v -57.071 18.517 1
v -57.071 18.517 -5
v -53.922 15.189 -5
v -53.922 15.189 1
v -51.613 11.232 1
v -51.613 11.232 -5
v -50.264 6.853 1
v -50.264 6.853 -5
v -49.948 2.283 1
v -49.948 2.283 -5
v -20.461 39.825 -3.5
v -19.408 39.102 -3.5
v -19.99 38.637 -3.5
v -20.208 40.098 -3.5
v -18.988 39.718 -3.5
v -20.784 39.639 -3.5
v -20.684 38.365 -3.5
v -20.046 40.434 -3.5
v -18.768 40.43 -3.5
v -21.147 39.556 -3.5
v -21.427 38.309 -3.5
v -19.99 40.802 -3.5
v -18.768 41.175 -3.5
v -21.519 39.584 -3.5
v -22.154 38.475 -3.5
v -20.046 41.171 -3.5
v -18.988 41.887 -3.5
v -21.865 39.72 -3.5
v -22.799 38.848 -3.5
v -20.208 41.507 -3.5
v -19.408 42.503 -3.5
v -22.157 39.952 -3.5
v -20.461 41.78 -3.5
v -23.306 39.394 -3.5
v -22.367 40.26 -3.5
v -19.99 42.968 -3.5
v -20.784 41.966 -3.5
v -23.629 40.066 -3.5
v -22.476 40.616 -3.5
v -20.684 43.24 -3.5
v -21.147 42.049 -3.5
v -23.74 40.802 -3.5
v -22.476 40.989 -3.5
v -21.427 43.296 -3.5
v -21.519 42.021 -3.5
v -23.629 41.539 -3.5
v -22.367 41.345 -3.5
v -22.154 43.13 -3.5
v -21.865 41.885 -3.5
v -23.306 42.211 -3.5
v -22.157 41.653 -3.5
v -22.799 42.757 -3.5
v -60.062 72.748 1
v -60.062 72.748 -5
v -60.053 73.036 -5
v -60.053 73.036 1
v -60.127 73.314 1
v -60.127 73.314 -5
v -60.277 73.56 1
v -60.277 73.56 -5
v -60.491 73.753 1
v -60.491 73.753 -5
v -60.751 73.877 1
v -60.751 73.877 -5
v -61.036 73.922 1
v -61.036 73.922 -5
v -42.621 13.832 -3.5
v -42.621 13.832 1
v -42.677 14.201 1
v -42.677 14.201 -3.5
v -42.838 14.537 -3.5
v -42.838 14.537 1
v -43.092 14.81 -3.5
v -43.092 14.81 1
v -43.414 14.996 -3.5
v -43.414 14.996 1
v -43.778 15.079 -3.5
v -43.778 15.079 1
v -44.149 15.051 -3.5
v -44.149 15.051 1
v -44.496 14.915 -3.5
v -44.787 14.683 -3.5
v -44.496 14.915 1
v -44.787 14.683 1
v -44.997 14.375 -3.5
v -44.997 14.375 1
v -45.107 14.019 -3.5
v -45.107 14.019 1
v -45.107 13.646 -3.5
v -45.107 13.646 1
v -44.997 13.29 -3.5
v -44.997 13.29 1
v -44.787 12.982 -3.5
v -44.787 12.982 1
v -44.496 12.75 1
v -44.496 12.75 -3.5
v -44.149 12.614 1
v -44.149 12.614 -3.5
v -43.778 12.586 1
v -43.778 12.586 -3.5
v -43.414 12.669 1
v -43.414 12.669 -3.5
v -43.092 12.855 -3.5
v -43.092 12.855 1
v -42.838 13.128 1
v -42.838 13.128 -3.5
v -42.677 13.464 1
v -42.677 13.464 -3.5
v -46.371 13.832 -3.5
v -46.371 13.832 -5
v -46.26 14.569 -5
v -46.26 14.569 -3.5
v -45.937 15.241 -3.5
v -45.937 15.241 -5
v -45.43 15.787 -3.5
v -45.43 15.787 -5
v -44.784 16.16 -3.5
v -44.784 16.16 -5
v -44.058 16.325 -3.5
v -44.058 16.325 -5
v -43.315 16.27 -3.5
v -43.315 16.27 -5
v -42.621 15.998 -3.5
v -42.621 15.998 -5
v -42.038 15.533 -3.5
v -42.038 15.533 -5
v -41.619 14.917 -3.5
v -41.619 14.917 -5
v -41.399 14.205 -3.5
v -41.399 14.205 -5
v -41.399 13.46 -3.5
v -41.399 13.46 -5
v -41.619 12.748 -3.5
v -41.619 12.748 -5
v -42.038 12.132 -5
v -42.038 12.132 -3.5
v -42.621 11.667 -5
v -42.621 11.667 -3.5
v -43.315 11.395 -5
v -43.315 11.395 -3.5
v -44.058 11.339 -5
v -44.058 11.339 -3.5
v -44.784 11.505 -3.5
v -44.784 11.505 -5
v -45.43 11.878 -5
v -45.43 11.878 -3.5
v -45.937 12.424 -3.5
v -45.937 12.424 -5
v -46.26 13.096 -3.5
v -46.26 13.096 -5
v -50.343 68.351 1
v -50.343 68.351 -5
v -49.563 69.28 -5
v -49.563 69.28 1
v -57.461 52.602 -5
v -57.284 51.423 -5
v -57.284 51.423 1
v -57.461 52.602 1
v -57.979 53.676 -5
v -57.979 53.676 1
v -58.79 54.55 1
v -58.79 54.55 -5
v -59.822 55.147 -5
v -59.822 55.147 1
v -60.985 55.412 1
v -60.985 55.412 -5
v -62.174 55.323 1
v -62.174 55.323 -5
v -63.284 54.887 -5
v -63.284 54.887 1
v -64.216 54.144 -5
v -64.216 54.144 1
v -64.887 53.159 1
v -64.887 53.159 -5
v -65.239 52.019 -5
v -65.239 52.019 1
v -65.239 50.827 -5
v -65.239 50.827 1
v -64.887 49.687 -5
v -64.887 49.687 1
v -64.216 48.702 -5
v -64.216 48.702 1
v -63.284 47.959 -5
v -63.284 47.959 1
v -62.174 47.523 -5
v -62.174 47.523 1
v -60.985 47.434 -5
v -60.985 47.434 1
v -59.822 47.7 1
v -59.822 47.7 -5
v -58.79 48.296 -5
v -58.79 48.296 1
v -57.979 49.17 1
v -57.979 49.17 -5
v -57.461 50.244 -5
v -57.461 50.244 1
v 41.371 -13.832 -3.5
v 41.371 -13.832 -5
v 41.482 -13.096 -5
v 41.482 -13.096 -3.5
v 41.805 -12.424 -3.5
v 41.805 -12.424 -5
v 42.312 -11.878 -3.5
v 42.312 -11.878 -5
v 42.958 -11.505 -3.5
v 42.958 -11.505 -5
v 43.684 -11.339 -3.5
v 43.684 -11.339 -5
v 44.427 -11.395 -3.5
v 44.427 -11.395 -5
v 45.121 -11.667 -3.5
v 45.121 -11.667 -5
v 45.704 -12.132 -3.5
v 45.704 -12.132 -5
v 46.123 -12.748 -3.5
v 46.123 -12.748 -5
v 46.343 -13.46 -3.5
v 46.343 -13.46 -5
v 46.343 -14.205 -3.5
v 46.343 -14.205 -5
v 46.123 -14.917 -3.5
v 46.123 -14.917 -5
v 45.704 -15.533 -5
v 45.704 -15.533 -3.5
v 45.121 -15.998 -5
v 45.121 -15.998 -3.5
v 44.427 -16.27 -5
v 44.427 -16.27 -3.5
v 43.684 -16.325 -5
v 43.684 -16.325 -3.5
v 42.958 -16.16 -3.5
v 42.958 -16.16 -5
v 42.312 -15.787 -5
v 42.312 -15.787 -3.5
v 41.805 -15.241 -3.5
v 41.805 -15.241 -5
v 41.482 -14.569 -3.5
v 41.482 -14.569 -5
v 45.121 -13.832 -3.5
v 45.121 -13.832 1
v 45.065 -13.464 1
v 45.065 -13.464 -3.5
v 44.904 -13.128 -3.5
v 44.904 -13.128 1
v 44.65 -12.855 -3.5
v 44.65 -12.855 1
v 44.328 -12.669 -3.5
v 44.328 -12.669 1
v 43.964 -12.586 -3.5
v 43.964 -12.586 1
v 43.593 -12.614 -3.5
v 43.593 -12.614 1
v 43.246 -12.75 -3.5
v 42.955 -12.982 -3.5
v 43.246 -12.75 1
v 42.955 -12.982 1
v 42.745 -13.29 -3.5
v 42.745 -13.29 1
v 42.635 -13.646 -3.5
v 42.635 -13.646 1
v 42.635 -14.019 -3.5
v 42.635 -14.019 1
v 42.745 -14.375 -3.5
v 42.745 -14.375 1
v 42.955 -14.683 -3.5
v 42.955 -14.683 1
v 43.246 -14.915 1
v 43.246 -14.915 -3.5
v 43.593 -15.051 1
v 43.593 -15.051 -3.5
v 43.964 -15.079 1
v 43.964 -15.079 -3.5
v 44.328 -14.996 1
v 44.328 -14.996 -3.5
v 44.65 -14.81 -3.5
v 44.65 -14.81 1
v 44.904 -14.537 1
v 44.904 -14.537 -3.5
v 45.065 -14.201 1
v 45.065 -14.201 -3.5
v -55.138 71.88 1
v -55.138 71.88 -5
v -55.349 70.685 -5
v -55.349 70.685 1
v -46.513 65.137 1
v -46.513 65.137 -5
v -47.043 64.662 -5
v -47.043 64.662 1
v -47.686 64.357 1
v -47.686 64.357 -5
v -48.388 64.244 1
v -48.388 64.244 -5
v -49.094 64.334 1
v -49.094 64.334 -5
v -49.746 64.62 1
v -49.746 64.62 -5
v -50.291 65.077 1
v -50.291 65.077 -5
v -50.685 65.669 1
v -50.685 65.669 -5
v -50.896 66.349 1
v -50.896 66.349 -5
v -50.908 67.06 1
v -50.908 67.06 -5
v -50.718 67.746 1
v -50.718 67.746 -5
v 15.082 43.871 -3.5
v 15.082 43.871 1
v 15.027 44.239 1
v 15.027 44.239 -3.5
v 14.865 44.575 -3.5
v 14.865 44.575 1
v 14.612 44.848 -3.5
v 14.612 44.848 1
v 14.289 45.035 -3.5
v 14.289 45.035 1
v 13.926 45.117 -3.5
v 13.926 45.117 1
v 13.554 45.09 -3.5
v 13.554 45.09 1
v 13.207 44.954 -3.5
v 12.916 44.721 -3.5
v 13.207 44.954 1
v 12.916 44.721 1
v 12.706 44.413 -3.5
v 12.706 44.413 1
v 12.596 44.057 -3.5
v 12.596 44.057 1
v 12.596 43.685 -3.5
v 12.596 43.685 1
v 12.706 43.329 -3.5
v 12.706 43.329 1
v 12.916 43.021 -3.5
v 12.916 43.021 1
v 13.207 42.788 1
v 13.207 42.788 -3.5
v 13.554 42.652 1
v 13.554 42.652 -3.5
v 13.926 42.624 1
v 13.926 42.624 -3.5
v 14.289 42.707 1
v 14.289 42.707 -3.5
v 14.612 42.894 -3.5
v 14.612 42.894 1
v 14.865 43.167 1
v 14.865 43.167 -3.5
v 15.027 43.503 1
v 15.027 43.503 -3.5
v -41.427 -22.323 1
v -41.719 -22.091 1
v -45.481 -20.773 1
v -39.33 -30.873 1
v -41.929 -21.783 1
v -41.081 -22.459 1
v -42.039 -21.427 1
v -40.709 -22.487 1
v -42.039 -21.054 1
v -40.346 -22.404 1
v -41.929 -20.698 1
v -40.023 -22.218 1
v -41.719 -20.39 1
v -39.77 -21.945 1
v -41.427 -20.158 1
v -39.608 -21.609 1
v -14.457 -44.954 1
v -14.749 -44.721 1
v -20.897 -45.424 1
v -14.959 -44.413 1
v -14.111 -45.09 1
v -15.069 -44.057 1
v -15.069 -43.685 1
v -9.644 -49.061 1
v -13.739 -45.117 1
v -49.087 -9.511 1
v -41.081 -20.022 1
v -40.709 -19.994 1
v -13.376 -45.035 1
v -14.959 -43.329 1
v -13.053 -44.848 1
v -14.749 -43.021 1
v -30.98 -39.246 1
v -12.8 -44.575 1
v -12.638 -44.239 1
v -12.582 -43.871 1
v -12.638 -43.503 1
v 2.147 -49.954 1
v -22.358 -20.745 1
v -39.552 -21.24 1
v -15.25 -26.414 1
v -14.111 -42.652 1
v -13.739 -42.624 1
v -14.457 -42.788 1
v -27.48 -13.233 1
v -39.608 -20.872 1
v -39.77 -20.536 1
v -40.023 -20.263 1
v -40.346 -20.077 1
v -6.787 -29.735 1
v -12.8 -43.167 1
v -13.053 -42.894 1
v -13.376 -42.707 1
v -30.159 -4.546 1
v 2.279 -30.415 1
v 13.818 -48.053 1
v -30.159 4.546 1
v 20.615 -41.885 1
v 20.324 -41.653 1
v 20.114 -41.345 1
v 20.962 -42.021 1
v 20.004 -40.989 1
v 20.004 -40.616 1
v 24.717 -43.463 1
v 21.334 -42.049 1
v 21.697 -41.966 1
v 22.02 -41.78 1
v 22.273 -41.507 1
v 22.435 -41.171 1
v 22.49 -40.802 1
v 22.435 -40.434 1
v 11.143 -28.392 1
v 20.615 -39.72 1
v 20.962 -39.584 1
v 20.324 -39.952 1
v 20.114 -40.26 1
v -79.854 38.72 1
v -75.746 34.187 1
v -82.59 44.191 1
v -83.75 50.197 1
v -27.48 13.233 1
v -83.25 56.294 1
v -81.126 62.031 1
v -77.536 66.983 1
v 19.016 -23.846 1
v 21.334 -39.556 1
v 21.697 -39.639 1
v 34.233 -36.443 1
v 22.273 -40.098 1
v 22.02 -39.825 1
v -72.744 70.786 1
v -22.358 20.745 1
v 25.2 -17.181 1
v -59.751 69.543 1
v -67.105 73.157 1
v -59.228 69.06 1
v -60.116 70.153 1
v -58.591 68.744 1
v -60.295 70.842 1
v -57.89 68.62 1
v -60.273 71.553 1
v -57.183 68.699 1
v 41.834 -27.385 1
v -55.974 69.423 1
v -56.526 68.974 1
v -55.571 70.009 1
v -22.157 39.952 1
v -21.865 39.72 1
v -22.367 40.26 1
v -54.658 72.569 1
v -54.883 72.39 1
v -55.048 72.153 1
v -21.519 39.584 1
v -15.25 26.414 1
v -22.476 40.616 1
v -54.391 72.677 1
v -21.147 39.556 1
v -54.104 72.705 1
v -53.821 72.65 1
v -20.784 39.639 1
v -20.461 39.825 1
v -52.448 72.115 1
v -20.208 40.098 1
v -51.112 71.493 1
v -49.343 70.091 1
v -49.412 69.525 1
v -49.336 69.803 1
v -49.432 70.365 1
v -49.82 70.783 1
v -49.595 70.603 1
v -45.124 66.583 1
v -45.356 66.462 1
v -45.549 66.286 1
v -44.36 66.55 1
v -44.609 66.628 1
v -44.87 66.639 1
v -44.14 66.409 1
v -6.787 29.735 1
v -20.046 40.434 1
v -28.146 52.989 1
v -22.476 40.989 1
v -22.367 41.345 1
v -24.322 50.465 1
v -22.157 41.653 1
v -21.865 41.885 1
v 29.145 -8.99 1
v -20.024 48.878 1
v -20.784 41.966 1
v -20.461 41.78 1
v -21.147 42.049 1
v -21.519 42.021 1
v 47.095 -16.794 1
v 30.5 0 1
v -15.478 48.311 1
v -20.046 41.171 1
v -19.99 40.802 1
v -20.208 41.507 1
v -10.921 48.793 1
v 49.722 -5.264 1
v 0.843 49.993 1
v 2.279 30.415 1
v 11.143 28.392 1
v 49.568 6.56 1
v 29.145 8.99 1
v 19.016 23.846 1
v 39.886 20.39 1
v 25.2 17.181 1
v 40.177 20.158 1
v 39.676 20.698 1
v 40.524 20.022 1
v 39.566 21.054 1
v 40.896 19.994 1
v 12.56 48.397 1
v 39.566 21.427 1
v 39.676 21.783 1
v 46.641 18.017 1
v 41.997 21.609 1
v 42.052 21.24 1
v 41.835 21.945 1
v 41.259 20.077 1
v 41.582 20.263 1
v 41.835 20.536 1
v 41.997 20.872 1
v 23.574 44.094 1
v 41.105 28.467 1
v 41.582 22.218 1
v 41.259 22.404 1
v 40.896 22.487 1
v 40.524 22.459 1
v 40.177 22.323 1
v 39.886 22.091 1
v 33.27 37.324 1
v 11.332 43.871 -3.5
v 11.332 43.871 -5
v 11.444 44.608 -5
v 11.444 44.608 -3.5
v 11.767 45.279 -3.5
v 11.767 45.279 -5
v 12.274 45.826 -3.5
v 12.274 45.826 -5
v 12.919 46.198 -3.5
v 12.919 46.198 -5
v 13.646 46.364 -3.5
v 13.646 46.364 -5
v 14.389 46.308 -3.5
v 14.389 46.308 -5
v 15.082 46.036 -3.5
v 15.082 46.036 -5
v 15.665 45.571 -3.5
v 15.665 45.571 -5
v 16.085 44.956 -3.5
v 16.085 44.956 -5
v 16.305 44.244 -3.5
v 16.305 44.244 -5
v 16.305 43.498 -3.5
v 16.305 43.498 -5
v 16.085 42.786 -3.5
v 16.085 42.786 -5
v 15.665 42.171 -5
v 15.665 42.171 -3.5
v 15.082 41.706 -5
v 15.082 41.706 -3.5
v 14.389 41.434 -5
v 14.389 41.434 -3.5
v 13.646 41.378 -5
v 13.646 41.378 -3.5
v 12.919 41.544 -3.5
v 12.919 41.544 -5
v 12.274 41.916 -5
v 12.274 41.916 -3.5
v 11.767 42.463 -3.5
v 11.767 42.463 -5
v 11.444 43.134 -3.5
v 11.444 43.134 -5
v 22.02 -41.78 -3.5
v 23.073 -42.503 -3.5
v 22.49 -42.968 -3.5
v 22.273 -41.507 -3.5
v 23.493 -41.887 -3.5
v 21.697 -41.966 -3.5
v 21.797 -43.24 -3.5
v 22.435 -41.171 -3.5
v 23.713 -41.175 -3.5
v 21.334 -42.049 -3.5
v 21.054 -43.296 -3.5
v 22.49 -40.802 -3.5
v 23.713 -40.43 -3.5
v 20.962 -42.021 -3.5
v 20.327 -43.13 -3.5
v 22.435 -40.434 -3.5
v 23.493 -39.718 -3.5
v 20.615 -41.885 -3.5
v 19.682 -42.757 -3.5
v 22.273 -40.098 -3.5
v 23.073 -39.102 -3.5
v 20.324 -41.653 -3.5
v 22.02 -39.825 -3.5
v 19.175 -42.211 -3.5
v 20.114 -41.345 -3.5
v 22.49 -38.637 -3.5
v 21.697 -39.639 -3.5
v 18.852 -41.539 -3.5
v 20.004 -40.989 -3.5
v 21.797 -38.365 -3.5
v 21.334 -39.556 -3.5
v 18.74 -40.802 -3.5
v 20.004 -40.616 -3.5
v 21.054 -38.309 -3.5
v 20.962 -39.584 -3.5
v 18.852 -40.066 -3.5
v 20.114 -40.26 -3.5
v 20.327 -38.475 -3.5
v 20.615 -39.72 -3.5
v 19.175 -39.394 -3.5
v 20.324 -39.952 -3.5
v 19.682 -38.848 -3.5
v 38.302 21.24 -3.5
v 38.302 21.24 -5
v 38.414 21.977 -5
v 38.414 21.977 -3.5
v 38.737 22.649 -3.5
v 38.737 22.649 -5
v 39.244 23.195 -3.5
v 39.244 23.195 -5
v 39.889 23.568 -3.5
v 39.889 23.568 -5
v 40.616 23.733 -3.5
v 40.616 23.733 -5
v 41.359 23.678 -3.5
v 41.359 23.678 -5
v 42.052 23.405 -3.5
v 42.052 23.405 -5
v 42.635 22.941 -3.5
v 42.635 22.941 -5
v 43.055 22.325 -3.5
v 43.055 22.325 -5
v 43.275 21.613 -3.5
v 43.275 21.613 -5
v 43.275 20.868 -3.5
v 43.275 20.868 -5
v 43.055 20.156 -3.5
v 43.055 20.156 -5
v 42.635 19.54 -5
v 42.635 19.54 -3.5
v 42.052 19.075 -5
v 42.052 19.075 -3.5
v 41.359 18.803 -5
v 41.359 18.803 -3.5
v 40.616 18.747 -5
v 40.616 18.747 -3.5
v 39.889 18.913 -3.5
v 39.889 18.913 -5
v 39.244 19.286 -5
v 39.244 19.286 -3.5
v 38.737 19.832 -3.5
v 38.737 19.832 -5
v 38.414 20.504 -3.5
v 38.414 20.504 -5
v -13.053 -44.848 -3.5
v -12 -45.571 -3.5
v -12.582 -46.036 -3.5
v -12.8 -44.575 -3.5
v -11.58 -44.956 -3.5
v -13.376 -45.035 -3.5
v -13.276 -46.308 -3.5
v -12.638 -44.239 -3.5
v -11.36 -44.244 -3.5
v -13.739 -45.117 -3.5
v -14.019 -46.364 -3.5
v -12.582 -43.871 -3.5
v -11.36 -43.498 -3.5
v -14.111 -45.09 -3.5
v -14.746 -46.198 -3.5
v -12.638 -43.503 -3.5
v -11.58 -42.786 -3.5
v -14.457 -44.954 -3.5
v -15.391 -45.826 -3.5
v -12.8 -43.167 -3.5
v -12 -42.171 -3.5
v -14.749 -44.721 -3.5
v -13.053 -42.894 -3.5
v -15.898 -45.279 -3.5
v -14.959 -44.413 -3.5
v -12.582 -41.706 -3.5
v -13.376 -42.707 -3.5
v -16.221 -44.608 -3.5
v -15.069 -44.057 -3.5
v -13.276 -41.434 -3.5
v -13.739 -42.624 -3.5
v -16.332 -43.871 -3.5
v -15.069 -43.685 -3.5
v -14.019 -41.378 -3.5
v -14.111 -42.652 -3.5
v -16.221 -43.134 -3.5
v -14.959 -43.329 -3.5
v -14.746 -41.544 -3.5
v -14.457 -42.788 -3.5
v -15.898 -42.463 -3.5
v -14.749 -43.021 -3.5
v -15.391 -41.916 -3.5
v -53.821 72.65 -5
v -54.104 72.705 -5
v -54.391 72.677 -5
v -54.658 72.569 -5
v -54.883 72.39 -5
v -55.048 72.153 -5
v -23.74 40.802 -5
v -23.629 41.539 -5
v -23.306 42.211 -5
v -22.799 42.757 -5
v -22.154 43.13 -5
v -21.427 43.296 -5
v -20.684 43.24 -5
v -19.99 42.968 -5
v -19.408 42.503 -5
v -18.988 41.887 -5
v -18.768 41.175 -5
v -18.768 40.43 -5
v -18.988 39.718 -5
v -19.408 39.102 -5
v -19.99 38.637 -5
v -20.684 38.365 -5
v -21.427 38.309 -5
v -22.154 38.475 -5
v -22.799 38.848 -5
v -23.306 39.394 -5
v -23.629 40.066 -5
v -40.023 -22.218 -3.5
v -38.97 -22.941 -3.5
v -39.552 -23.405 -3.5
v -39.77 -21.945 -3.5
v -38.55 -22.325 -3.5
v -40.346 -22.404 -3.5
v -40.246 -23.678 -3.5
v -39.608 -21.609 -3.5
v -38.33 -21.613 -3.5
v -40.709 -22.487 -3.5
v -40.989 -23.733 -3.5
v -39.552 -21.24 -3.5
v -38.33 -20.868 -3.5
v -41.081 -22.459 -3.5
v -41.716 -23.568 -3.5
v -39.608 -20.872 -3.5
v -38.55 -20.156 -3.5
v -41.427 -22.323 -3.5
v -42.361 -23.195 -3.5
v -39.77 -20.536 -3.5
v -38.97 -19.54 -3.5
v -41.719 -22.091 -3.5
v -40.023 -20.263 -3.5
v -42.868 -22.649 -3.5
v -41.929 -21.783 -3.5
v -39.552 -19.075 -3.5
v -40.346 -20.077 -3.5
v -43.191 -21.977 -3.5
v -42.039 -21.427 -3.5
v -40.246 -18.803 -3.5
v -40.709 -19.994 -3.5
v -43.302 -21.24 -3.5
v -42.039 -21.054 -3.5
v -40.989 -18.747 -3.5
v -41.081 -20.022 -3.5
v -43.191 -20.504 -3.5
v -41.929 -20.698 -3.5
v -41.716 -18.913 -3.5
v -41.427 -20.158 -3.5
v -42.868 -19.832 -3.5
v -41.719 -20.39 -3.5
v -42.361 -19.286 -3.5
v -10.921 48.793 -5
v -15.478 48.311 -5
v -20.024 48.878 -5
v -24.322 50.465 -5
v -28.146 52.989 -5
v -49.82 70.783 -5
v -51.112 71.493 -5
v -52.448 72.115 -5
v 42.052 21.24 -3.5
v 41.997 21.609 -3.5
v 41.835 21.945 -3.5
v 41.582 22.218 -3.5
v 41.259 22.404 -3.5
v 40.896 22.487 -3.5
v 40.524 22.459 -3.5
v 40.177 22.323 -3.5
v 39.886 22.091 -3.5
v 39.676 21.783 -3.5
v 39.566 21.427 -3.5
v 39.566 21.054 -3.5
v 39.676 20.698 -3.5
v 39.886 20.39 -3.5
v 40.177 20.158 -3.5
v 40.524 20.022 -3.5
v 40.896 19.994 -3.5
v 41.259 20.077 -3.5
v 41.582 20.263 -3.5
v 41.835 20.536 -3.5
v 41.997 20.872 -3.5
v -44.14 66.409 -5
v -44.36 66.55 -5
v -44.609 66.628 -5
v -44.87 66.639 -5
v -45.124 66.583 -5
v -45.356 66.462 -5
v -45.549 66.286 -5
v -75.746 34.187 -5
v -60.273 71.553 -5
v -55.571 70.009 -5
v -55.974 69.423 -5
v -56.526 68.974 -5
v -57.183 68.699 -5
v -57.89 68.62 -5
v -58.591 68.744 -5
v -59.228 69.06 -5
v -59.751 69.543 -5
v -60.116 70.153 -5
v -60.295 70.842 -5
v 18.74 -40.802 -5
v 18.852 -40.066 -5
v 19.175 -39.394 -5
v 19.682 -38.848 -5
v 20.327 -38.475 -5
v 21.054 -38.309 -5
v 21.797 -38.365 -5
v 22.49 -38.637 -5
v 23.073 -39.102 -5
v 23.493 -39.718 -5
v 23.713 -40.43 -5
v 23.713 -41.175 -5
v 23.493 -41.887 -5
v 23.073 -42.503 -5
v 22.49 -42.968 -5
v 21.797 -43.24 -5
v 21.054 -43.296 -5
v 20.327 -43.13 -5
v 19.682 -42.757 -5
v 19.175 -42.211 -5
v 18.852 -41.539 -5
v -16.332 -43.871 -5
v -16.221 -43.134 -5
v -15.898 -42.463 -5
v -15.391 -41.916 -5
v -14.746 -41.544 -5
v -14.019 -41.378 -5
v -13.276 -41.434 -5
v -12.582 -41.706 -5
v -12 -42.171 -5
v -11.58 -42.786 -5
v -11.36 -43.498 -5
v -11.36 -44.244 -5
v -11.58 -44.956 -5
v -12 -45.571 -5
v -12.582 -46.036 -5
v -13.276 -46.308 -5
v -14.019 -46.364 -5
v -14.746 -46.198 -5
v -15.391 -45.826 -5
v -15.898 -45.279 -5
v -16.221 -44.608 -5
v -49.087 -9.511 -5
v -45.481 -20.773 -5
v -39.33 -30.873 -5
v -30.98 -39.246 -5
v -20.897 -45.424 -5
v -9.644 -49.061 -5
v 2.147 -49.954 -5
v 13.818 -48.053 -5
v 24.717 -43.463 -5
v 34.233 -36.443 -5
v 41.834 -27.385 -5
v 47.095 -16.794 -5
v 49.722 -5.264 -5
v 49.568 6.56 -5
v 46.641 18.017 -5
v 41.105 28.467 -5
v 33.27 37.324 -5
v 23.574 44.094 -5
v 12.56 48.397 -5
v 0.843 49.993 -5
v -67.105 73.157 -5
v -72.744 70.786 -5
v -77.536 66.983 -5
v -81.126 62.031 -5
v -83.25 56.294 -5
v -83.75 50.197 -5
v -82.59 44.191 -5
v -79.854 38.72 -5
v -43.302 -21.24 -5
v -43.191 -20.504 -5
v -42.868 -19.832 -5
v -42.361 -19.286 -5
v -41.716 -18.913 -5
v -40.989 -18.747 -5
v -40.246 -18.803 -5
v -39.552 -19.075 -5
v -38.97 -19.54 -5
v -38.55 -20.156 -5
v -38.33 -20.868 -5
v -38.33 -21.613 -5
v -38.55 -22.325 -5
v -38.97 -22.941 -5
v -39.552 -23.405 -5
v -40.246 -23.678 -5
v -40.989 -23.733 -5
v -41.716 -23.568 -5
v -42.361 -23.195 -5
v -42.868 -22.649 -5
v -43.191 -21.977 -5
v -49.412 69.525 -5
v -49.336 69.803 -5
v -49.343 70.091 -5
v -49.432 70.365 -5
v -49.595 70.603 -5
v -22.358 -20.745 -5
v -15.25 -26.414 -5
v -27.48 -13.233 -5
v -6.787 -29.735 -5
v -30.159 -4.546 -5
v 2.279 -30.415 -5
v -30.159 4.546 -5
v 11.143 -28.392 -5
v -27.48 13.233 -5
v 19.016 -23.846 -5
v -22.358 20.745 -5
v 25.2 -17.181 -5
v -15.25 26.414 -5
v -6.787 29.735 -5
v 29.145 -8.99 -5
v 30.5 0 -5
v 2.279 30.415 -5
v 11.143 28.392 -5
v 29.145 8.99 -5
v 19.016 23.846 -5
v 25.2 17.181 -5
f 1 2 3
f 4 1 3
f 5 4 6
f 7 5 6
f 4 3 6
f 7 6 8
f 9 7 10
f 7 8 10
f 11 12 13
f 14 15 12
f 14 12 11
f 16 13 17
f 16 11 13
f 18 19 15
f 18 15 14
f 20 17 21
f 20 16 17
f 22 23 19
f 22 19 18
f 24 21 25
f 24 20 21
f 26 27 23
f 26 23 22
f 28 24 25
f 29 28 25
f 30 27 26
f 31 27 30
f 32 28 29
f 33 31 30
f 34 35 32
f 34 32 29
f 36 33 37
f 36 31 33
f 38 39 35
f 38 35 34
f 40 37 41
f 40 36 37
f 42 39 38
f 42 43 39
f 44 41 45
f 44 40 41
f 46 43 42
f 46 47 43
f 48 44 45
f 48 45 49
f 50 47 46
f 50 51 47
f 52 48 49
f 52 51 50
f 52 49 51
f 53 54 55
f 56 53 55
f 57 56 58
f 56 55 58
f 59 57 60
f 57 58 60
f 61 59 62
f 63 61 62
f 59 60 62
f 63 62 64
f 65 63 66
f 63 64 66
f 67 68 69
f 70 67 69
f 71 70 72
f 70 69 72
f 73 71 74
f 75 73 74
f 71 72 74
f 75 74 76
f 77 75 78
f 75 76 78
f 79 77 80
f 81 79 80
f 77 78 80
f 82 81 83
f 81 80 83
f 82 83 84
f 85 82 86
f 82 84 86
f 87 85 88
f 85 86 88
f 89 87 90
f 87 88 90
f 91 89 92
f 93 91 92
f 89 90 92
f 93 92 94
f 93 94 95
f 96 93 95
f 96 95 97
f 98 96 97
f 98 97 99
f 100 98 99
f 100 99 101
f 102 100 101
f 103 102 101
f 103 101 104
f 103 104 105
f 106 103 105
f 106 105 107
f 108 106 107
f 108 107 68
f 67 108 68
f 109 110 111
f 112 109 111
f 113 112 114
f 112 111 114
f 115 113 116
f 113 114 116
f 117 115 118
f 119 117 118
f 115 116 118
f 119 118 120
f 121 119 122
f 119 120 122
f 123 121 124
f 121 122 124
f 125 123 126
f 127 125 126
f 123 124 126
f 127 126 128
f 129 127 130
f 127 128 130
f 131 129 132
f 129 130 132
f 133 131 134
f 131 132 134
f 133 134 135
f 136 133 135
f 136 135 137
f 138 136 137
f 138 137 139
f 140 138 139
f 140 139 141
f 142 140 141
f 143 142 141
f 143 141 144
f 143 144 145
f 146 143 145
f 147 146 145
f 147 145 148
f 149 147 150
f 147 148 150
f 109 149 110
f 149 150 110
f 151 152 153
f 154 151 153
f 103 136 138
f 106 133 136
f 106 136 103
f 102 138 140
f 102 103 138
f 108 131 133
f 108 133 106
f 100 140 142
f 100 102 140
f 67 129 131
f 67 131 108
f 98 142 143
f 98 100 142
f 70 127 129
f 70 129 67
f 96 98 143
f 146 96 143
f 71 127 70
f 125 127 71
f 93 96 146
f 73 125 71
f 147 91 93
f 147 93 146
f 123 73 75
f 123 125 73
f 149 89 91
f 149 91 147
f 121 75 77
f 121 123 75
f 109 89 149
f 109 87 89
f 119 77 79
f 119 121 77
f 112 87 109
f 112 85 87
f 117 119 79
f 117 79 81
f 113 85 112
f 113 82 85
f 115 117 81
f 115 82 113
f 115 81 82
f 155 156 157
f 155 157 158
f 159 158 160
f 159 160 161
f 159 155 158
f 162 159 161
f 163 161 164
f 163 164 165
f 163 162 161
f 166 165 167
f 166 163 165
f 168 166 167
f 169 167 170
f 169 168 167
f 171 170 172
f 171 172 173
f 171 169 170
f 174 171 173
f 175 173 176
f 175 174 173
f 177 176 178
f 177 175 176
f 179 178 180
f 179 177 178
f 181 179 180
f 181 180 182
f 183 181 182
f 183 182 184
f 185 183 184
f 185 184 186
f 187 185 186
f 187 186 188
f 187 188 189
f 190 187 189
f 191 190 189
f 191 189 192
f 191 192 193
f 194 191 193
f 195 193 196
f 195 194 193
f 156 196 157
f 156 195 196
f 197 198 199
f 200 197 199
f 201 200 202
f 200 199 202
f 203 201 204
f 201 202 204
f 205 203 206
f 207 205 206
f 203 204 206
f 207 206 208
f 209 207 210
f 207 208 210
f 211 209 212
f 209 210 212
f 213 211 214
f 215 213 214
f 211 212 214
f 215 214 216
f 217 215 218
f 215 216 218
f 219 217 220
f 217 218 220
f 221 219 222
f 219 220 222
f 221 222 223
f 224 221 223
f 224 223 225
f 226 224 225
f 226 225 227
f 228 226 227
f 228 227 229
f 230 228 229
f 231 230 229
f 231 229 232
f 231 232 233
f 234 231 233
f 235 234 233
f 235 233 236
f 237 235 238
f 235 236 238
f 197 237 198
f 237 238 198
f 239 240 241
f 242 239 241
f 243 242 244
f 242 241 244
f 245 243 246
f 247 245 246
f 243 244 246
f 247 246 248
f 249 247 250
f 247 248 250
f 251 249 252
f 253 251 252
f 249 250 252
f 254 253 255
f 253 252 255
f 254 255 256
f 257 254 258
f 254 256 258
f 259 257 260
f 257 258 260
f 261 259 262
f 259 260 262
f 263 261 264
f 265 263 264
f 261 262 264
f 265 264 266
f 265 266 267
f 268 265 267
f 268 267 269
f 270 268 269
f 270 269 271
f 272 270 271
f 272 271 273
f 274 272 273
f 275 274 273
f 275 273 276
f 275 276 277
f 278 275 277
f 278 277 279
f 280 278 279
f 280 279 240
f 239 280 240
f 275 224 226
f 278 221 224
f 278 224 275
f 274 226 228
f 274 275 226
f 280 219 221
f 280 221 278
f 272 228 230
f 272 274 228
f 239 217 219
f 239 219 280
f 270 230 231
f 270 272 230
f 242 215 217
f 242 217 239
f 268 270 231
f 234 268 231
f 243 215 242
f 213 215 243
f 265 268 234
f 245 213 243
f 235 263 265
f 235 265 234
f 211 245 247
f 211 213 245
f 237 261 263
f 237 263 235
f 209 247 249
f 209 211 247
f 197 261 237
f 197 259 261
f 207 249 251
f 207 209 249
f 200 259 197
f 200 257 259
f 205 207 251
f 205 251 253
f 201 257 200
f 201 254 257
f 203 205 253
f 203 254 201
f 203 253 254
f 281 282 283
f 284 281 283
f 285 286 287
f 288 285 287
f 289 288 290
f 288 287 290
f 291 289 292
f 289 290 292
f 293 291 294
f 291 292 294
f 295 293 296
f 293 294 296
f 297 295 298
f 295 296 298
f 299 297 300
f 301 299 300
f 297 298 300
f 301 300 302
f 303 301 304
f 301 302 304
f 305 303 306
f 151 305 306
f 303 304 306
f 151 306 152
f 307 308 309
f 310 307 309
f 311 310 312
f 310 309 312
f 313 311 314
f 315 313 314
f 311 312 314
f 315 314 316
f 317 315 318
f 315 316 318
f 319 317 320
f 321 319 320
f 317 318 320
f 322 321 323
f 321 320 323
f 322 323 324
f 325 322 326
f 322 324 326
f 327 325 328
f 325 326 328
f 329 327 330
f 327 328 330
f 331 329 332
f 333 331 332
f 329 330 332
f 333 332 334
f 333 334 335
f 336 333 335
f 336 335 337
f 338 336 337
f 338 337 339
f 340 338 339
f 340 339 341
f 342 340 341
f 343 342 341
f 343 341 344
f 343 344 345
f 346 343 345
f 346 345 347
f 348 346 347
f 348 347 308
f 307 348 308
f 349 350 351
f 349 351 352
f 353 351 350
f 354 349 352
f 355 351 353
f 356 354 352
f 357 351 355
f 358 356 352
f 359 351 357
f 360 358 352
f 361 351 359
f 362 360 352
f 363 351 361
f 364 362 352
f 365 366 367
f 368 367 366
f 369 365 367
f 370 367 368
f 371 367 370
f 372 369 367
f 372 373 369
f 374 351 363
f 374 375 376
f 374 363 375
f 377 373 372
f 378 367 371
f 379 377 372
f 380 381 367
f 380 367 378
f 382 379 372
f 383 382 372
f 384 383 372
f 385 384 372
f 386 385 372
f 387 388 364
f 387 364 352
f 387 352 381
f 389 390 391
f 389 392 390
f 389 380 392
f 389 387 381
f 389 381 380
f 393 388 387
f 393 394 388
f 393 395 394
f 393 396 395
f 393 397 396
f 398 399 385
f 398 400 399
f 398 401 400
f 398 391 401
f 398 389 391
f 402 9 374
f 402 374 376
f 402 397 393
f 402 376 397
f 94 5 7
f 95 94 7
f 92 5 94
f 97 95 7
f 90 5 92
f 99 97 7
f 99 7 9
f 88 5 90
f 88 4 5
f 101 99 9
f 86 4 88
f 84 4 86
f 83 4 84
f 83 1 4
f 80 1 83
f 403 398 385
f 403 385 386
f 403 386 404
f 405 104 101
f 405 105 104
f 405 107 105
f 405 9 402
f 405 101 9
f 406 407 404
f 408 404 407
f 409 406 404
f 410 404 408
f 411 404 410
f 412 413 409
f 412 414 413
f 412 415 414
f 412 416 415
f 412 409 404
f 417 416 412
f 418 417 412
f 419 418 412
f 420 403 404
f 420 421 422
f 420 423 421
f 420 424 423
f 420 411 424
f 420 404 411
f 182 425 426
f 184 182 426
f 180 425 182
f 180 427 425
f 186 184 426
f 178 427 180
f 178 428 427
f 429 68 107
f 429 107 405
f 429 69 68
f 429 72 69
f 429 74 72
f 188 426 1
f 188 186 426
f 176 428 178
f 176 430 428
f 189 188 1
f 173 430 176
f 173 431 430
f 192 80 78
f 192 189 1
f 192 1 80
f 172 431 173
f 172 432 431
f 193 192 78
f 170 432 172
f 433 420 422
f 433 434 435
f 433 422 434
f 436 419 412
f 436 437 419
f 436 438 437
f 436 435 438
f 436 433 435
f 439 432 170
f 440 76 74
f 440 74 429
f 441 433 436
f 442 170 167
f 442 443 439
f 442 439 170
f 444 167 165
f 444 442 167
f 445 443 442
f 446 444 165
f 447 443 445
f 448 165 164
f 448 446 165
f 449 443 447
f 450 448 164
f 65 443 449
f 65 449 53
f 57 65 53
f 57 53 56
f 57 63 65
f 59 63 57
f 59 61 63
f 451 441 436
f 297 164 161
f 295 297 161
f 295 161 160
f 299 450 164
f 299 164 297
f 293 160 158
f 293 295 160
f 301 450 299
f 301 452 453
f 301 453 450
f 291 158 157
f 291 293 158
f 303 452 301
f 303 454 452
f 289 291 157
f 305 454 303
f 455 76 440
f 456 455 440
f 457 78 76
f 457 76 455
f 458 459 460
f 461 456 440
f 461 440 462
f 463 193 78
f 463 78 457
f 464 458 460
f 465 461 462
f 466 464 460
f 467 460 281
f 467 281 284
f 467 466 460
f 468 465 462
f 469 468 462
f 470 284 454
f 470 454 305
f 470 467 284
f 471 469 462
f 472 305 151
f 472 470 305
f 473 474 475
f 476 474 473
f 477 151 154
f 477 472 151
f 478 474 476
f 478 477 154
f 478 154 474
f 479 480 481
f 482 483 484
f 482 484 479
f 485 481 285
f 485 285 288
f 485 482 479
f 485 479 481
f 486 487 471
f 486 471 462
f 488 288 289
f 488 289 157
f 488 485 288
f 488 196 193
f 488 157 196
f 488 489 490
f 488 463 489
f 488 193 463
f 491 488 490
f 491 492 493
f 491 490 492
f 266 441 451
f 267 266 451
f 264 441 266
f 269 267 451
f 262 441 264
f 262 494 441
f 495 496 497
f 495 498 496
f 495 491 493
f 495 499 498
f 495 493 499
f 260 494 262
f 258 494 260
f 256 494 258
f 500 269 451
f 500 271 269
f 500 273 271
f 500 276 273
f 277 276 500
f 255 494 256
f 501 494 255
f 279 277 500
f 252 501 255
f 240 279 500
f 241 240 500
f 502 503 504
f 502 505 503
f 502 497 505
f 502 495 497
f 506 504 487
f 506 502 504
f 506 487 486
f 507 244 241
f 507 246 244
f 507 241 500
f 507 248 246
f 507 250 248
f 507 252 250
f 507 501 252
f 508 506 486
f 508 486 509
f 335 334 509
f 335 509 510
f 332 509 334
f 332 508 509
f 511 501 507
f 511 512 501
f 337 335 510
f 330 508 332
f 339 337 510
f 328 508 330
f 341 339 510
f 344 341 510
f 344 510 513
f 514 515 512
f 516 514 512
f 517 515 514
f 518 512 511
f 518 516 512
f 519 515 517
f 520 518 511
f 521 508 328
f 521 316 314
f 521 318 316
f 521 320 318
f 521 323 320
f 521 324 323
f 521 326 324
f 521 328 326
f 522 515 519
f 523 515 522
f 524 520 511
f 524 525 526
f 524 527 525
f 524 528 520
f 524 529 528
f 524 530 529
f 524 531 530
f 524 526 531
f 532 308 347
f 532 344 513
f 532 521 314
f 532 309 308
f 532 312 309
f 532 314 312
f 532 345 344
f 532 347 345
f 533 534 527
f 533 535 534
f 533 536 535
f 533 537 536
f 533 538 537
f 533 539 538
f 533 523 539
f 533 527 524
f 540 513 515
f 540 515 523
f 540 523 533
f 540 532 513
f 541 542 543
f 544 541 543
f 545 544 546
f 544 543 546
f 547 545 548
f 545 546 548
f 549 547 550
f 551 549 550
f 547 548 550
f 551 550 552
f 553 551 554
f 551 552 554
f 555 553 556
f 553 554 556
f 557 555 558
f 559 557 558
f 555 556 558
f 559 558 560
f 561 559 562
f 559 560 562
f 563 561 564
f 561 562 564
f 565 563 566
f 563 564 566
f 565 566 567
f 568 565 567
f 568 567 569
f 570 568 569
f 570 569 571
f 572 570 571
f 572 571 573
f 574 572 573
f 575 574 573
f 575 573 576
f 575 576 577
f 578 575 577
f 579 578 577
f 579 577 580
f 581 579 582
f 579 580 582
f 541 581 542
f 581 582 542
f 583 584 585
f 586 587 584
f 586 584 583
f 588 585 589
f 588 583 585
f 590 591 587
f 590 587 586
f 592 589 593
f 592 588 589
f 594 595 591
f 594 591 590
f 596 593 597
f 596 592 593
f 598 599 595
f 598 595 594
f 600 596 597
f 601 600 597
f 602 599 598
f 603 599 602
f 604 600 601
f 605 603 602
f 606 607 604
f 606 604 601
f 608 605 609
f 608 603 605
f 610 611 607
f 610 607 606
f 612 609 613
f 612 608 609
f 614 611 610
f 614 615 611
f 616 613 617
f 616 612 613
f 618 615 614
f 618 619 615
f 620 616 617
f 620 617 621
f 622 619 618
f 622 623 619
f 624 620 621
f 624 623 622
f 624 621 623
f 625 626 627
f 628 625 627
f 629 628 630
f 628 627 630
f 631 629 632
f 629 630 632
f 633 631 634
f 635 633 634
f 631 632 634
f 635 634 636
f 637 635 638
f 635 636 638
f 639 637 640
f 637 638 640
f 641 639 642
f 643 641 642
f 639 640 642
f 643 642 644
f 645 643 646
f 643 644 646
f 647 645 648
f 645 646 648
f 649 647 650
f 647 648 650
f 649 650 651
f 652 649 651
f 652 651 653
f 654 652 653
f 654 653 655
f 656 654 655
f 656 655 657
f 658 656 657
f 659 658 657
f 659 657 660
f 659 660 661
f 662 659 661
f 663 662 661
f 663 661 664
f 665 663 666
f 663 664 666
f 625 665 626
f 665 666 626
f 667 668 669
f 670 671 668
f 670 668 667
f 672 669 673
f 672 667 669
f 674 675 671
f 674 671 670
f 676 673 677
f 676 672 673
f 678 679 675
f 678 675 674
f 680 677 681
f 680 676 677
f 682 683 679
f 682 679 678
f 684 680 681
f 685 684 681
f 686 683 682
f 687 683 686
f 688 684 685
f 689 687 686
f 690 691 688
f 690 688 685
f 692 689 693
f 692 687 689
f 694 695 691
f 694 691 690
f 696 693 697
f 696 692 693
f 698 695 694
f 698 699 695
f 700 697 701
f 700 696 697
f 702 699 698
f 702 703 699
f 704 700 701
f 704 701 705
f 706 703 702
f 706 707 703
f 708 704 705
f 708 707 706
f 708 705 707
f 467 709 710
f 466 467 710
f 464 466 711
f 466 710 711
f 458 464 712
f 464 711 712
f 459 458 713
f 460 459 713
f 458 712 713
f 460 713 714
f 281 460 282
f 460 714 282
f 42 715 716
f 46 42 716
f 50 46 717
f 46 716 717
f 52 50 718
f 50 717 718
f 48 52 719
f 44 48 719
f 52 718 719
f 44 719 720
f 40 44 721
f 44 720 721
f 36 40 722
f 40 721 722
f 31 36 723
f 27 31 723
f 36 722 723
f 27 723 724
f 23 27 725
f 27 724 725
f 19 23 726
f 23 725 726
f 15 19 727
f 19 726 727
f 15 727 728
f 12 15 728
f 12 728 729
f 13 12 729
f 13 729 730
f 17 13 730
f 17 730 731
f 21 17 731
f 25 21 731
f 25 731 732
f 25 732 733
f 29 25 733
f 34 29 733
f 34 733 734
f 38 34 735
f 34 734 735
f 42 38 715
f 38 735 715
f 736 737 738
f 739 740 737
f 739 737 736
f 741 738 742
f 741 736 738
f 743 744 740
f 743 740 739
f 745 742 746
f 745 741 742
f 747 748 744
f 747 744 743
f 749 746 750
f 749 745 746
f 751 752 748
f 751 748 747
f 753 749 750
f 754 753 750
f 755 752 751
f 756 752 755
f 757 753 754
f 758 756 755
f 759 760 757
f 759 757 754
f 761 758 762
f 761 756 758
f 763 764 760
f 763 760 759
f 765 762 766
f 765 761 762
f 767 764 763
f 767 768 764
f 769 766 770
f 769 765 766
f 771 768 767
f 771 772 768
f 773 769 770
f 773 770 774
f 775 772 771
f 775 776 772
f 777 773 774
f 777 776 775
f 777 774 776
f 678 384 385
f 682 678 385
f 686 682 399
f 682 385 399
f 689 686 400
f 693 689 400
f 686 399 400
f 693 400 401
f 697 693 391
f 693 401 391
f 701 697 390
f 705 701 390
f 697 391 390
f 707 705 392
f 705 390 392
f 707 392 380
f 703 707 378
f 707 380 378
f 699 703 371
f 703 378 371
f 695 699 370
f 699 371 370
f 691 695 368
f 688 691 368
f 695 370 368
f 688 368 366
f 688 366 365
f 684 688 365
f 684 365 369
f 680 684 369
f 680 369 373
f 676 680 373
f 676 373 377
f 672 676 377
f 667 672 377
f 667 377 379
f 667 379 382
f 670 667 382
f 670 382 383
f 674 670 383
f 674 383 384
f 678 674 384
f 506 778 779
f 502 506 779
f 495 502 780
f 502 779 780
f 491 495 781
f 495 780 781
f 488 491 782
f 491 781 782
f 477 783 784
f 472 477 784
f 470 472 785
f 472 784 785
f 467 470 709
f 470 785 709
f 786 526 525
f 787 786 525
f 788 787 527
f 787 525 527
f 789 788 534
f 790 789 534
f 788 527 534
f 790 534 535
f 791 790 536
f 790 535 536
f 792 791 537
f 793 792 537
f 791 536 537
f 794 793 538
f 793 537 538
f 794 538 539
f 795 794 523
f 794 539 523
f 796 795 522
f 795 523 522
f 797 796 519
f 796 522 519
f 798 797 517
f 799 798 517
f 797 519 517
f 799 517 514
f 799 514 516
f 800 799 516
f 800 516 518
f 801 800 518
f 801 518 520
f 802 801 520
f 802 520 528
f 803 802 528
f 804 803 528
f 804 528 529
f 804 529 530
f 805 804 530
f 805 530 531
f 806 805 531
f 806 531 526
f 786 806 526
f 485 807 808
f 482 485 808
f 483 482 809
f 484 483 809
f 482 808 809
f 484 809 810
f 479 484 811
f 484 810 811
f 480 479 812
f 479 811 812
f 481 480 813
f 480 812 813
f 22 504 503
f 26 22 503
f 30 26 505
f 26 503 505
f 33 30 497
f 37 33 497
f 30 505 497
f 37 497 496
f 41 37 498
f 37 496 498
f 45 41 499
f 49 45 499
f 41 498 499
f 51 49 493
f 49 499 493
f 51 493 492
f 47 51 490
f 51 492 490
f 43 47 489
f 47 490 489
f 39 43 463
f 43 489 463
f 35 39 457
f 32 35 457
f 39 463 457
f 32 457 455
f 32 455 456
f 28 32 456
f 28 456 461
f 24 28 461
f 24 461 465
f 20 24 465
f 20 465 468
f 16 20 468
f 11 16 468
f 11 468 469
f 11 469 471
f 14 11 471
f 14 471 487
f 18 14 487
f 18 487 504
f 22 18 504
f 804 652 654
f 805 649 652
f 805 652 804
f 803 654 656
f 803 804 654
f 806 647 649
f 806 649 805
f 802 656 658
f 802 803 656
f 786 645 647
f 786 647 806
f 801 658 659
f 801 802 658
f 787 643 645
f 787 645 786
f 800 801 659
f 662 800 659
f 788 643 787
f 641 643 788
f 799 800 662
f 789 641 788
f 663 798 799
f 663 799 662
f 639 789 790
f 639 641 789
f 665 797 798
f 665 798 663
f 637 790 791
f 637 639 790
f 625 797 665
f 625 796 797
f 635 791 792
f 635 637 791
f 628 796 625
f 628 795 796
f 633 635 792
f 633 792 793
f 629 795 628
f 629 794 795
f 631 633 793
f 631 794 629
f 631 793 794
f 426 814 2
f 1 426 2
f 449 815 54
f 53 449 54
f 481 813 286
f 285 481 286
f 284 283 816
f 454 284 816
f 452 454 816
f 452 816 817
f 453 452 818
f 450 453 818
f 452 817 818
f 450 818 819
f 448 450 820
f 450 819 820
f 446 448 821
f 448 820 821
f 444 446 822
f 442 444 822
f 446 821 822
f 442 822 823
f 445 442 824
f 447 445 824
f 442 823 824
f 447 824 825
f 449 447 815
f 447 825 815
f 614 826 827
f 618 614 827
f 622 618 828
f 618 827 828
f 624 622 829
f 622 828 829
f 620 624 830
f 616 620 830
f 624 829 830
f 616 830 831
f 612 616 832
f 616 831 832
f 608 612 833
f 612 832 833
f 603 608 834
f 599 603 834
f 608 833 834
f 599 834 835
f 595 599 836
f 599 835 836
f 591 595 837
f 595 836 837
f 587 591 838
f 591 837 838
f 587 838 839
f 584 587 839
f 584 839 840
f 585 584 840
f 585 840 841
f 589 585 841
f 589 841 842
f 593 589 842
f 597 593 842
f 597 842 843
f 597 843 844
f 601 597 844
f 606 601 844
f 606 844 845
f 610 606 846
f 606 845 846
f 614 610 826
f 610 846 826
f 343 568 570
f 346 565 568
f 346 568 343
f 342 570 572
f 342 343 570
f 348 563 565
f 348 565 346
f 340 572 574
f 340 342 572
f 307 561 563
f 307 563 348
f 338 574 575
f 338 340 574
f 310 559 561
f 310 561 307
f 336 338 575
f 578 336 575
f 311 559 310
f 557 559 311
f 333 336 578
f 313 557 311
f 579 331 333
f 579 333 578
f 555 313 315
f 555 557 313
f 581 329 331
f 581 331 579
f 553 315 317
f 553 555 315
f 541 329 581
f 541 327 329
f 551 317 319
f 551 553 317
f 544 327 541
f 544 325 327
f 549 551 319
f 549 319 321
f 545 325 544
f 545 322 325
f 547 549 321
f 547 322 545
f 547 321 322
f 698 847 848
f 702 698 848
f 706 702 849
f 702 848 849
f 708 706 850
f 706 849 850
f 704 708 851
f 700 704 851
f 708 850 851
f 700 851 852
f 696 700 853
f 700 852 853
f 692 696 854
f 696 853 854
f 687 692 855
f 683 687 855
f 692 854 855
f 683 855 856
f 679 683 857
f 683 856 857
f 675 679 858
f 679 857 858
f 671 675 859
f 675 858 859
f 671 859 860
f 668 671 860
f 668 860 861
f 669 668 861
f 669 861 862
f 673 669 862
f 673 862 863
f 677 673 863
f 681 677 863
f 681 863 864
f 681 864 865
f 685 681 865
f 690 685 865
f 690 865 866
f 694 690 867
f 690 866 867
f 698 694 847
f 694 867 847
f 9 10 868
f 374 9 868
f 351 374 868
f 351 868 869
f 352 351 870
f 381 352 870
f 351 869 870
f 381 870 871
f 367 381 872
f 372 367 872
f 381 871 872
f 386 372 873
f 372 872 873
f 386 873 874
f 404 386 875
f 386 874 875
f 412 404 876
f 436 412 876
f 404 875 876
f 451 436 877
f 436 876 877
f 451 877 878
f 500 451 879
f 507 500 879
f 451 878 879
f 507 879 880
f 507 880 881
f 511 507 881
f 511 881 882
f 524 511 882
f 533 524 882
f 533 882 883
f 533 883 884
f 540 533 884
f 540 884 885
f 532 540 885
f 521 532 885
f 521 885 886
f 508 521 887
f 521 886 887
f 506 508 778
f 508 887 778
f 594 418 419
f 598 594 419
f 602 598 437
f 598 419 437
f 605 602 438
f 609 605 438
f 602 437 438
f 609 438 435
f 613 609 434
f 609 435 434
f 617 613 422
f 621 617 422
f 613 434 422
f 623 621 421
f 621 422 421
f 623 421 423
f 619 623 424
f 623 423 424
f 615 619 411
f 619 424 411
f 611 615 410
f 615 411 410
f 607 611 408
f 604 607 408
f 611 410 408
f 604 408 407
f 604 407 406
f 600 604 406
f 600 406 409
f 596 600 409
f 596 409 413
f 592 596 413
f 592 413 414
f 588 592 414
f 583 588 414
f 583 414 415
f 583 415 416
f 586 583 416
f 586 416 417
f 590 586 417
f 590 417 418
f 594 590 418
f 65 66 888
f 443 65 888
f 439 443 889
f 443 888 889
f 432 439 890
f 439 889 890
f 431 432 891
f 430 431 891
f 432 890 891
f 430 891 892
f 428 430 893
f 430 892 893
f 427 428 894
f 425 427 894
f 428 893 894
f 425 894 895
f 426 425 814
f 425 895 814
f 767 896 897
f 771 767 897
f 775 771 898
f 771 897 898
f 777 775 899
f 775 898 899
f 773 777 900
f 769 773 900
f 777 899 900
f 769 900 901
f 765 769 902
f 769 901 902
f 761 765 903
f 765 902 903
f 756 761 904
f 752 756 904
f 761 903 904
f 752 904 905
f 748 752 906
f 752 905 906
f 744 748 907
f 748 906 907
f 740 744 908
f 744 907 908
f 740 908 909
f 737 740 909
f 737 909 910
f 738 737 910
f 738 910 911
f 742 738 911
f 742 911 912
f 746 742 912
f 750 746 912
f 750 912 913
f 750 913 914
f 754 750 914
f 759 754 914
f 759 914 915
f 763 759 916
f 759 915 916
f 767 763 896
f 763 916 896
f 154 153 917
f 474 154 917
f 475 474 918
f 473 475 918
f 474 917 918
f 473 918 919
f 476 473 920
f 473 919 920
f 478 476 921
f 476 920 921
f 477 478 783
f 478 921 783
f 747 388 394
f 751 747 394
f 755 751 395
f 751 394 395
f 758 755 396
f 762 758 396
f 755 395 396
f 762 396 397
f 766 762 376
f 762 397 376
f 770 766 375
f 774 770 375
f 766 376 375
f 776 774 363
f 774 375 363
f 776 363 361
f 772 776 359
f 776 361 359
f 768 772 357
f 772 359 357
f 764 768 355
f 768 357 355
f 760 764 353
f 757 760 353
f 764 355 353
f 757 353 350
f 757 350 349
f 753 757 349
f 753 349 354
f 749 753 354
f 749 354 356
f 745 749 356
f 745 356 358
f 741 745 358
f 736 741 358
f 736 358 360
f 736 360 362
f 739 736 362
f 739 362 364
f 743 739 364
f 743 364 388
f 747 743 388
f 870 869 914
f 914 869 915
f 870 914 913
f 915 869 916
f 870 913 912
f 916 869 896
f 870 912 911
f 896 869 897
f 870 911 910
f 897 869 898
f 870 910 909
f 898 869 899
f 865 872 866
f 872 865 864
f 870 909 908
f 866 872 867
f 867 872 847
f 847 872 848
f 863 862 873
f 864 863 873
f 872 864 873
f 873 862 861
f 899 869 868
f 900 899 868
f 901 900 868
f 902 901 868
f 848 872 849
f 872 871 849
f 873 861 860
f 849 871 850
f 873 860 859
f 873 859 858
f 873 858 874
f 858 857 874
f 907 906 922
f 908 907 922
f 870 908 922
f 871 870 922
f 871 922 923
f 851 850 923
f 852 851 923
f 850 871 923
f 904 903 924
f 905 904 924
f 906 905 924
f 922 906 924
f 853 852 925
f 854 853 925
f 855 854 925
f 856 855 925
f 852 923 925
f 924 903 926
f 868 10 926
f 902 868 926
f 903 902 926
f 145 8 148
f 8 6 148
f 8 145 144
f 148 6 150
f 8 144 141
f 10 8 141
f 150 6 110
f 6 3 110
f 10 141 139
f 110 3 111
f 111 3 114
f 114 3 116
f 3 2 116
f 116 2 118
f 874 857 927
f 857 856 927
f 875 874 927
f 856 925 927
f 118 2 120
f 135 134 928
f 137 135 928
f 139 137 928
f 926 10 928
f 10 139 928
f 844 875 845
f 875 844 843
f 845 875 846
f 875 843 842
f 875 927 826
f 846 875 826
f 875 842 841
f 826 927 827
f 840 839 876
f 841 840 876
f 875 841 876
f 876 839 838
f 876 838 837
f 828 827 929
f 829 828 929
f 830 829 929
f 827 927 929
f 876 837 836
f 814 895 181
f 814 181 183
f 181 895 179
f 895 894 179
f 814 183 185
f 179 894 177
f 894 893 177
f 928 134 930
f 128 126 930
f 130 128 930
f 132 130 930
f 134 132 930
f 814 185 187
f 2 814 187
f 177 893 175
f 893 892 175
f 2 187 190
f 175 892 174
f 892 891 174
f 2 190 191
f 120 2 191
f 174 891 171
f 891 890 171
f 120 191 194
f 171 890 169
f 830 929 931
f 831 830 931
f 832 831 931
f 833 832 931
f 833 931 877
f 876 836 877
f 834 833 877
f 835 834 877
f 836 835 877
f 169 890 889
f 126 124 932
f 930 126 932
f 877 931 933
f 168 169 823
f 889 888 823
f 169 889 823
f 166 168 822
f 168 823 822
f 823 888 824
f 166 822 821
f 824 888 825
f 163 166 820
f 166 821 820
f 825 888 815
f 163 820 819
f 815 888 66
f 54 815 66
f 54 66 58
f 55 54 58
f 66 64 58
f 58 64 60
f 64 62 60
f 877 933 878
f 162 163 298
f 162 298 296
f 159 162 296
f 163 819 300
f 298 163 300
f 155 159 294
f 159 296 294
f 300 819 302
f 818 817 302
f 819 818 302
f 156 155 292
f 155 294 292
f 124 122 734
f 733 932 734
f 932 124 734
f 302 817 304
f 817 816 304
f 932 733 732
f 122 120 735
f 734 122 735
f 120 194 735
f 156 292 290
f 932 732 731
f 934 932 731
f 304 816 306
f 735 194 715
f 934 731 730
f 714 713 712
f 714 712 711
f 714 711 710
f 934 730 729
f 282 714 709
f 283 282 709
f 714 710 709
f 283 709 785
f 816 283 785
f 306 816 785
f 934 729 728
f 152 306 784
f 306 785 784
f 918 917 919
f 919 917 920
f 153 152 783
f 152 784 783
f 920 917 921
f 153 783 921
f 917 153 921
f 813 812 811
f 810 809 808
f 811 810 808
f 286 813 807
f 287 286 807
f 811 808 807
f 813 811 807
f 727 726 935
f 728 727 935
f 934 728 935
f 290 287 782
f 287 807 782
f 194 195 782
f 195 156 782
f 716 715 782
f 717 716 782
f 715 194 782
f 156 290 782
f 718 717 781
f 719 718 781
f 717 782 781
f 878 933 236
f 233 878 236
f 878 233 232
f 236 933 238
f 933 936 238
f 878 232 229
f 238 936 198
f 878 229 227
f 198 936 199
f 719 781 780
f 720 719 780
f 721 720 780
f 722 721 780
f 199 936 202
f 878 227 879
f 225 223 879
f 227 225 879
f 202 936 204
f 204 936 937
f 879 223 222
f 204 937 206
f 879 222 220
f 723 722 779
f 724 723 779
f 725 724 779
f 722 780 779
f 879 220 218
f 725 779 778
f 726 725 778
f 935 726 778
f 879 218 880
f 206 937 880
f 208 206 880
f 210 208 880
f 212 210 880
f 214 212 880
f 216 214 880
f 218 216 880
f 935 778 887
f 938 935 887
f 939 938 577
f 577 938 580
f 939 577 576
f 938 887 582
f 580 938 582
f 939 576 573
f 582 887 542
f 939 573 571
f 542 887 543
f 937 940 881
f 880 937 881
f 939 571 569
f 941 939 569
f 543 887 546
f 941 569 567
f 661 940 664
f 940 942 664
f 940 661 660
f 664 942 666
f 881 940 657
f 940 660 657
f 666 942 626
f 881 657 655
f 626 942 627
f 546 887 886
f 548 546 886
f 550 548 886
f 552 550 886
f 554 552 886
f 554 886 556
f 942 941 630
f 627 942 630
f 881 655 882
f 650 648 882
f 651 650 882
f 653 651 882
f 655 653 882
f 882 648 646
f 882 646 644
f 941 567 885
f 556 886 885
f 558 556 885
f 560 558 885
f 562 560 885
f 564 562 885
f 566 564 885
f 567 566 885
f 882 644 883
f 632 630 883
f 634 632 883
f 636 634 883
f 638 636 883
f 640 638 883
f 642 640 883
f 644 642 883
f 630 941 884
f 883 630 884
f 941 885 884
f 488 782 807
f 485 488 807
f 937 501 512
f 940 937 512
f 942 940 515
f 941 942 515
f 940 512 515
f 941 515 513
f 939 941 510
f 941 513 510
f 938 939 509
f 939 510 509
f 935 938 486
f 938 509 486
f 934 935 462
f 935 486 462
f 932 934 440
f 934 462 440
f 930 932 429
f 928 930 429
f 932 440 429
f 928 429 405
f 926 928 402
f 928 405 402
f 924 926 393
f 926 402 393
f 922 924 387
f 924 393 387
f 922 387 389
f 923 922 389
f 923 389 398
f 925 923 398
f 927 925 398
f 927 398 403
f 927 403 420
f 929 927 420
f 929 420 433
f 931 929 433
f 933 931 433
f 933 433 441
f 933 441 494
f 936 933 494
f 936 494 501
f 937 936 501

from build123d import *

# Parameters (mm, degrees)
EXTRUDE_2_DEPTH      = 1
EXTRUDE_2_DEPTH_BACK = 5
SKETCH_1_R           = 4
SKETCH_2_R           = 1.25
SKETCH_2_R_2         = 30.5
CUT_EXTRUDE_1_DEPTH  = 10
SKETCH_3_R           = 2.5
CUT_EXTRUDE_2_DEPTH  = 1.5


with BuildPart() as part:
    # 草图1 → 凸台-拉伸2 (new, two sides: drawn at the far end of the back side and taken through both)
    with BuildSketch(Plane.XY.offset(-EXTRUDE_2_DEPTH_BACK)):
        with BuildLine():
            Line((-28.145811083, 52.988803709), (-44.139678681, 66.409252111))
            ThreePointArc((-44.139678681, 66.409252111), (-44.869622033, 66.639402366), (-45.548510733, 66.285995278))
            Line((-45.548510733, 66.285995278), (-46.512692148, 65.136928613))
            ThreePointArc((-46.512692148, 65.136928613), (-50.03477228, 64.82878653), (-50.342914364, 68.350866662))
            Line((-50.342914364, 68.350866662), (-49.563082227, 69.280234412))
            ThreePointArc((-49.563082227, 69.280234412), (-49.343377533, 70.09124401), (-49.819618355, 70.783487754))
            ThreePointArc((-49.819618355, 70.783487754), (-51.77464456, 71.814933983), (-53.821444834, 72.649570088))
            ThreePointArc((-53.821444834, 72.649570088), (-54.657856007, 72.569426022), (-55.137901948, 71.87981554))
            Line((-55.137901948, 71.87981554), (-55.348572514, 70.685043391))
            ThreePointArc((-55.348572514, 70.685043391), (-58.24471234, 68.657144453), (-60.272611279, 71.553284279))
            Line((-60.272611279, 71.553284279), (-60.061940713, 72.748056429))
            ThreePointArc((-60.061940713, 72.748056429), (-60.277175665, 73.560263691), (-61.035734188, 73.921643947))
            ThreePointArc((-61.035734188, 73.921643947), (-82.383938211, 59.234784971), (-75.746276667, 34.187008805))
            Line((-75.746276667, 34.187008805), (-57.071253519, 18.516803768))
            ThreePointArc((-57.071253519, 18.516803768), (-51.612575359, 11.232185237), (-49.947861223, 2.282796361))
            ThreePointArc((-49.947861223, 2.282796361), (38.302222156, -32.139380484), (-10.921470635, 48.792637551))
            ThreePointArc((-10.921470635, 48.792637551), (-20.02397276, 48.878015869), (-28.145811083, 52.988803709))
        make_face()
        with Locations((-61.28355545, 51.423008775)):
            Circle(SKETCH_1_R, mode=Mode.SUBTRACT)
    extrude(amount=EXTRUDE_2_DEPTH + EXTRUDE_2_DEPTH_BACK)

    # 草图2 → 切除-拉伸1 (cut)
    with BuildSketch(Plane.XY.offset(1)):
        with Locations((-21.240436209, 40.802498326)):
            Circle(SKETCH_2_R)
        with Locations((13.832466777, 43.870979734)):
            Circle(SKETCH_2_R)
        with Locations((40.802498326, 21.240436209)):
            Circle(SKETCH_2_R)
        with Locations((43.870979734, -13.832466777)):
            Circle(SKETCH_2_R)
        with Locations((21.240436209, -40.802498326)):
            Circle(SKETCH_2_R)
        with Locations((-13.832466777, -43.870979734)):
            Circle(SKETCH_2_R)
        with Locations((-40.802498326, -21.240436209)):
            Circle(SKETCH_2_R)
        with Locations((-43.870979734, 13.832466777)):
            Circle(SKETCH_2_R)
        Circle(SKETCH_2_R_2)
    extrude(amount=-CUT_EXTRUDE_1_DEPTH, mode=Mode.SUBTRACT)

    # 草图3 → 切除-拉伸2 (cut)
    with BuildSketch(Plane(origin=(0, 0, -5), x_dir=(-1, 0, 0), z_dir=(0, 0, -1))):
        with Locations((-13.832466777, 43.870979734)):
            Circle(SKETCH_3_R)
        with Locations((21.240436209, 40.802498326)):
            Circle(SKETCH_3_R)
        with Locations((43.870979734, 13.832466777)):
            Circle(SKETCH_3_R)
        with Locations((40.802498326, -21.240436209)):
            Circle(SKETCH_3_R)
        with Locations((13.832466777, -43.870979734)):
            Circle(SKETCH_3_R)
        with Locations((-21.240436209, -40.802498326)):
            Circle(SKETCH_3_R)
        with Locations((-43.870979734, -13.832466777)):
            Circle(SKETCH_3_R)
        with Locations((-40.802498326, 21.240436209)):
            Circle(SKETCH_3_R)
    extrude(amount=-CUT_EXTRUDE_2_DEPTH, mode=Mode.SUBTRACT)


solid = part.part
